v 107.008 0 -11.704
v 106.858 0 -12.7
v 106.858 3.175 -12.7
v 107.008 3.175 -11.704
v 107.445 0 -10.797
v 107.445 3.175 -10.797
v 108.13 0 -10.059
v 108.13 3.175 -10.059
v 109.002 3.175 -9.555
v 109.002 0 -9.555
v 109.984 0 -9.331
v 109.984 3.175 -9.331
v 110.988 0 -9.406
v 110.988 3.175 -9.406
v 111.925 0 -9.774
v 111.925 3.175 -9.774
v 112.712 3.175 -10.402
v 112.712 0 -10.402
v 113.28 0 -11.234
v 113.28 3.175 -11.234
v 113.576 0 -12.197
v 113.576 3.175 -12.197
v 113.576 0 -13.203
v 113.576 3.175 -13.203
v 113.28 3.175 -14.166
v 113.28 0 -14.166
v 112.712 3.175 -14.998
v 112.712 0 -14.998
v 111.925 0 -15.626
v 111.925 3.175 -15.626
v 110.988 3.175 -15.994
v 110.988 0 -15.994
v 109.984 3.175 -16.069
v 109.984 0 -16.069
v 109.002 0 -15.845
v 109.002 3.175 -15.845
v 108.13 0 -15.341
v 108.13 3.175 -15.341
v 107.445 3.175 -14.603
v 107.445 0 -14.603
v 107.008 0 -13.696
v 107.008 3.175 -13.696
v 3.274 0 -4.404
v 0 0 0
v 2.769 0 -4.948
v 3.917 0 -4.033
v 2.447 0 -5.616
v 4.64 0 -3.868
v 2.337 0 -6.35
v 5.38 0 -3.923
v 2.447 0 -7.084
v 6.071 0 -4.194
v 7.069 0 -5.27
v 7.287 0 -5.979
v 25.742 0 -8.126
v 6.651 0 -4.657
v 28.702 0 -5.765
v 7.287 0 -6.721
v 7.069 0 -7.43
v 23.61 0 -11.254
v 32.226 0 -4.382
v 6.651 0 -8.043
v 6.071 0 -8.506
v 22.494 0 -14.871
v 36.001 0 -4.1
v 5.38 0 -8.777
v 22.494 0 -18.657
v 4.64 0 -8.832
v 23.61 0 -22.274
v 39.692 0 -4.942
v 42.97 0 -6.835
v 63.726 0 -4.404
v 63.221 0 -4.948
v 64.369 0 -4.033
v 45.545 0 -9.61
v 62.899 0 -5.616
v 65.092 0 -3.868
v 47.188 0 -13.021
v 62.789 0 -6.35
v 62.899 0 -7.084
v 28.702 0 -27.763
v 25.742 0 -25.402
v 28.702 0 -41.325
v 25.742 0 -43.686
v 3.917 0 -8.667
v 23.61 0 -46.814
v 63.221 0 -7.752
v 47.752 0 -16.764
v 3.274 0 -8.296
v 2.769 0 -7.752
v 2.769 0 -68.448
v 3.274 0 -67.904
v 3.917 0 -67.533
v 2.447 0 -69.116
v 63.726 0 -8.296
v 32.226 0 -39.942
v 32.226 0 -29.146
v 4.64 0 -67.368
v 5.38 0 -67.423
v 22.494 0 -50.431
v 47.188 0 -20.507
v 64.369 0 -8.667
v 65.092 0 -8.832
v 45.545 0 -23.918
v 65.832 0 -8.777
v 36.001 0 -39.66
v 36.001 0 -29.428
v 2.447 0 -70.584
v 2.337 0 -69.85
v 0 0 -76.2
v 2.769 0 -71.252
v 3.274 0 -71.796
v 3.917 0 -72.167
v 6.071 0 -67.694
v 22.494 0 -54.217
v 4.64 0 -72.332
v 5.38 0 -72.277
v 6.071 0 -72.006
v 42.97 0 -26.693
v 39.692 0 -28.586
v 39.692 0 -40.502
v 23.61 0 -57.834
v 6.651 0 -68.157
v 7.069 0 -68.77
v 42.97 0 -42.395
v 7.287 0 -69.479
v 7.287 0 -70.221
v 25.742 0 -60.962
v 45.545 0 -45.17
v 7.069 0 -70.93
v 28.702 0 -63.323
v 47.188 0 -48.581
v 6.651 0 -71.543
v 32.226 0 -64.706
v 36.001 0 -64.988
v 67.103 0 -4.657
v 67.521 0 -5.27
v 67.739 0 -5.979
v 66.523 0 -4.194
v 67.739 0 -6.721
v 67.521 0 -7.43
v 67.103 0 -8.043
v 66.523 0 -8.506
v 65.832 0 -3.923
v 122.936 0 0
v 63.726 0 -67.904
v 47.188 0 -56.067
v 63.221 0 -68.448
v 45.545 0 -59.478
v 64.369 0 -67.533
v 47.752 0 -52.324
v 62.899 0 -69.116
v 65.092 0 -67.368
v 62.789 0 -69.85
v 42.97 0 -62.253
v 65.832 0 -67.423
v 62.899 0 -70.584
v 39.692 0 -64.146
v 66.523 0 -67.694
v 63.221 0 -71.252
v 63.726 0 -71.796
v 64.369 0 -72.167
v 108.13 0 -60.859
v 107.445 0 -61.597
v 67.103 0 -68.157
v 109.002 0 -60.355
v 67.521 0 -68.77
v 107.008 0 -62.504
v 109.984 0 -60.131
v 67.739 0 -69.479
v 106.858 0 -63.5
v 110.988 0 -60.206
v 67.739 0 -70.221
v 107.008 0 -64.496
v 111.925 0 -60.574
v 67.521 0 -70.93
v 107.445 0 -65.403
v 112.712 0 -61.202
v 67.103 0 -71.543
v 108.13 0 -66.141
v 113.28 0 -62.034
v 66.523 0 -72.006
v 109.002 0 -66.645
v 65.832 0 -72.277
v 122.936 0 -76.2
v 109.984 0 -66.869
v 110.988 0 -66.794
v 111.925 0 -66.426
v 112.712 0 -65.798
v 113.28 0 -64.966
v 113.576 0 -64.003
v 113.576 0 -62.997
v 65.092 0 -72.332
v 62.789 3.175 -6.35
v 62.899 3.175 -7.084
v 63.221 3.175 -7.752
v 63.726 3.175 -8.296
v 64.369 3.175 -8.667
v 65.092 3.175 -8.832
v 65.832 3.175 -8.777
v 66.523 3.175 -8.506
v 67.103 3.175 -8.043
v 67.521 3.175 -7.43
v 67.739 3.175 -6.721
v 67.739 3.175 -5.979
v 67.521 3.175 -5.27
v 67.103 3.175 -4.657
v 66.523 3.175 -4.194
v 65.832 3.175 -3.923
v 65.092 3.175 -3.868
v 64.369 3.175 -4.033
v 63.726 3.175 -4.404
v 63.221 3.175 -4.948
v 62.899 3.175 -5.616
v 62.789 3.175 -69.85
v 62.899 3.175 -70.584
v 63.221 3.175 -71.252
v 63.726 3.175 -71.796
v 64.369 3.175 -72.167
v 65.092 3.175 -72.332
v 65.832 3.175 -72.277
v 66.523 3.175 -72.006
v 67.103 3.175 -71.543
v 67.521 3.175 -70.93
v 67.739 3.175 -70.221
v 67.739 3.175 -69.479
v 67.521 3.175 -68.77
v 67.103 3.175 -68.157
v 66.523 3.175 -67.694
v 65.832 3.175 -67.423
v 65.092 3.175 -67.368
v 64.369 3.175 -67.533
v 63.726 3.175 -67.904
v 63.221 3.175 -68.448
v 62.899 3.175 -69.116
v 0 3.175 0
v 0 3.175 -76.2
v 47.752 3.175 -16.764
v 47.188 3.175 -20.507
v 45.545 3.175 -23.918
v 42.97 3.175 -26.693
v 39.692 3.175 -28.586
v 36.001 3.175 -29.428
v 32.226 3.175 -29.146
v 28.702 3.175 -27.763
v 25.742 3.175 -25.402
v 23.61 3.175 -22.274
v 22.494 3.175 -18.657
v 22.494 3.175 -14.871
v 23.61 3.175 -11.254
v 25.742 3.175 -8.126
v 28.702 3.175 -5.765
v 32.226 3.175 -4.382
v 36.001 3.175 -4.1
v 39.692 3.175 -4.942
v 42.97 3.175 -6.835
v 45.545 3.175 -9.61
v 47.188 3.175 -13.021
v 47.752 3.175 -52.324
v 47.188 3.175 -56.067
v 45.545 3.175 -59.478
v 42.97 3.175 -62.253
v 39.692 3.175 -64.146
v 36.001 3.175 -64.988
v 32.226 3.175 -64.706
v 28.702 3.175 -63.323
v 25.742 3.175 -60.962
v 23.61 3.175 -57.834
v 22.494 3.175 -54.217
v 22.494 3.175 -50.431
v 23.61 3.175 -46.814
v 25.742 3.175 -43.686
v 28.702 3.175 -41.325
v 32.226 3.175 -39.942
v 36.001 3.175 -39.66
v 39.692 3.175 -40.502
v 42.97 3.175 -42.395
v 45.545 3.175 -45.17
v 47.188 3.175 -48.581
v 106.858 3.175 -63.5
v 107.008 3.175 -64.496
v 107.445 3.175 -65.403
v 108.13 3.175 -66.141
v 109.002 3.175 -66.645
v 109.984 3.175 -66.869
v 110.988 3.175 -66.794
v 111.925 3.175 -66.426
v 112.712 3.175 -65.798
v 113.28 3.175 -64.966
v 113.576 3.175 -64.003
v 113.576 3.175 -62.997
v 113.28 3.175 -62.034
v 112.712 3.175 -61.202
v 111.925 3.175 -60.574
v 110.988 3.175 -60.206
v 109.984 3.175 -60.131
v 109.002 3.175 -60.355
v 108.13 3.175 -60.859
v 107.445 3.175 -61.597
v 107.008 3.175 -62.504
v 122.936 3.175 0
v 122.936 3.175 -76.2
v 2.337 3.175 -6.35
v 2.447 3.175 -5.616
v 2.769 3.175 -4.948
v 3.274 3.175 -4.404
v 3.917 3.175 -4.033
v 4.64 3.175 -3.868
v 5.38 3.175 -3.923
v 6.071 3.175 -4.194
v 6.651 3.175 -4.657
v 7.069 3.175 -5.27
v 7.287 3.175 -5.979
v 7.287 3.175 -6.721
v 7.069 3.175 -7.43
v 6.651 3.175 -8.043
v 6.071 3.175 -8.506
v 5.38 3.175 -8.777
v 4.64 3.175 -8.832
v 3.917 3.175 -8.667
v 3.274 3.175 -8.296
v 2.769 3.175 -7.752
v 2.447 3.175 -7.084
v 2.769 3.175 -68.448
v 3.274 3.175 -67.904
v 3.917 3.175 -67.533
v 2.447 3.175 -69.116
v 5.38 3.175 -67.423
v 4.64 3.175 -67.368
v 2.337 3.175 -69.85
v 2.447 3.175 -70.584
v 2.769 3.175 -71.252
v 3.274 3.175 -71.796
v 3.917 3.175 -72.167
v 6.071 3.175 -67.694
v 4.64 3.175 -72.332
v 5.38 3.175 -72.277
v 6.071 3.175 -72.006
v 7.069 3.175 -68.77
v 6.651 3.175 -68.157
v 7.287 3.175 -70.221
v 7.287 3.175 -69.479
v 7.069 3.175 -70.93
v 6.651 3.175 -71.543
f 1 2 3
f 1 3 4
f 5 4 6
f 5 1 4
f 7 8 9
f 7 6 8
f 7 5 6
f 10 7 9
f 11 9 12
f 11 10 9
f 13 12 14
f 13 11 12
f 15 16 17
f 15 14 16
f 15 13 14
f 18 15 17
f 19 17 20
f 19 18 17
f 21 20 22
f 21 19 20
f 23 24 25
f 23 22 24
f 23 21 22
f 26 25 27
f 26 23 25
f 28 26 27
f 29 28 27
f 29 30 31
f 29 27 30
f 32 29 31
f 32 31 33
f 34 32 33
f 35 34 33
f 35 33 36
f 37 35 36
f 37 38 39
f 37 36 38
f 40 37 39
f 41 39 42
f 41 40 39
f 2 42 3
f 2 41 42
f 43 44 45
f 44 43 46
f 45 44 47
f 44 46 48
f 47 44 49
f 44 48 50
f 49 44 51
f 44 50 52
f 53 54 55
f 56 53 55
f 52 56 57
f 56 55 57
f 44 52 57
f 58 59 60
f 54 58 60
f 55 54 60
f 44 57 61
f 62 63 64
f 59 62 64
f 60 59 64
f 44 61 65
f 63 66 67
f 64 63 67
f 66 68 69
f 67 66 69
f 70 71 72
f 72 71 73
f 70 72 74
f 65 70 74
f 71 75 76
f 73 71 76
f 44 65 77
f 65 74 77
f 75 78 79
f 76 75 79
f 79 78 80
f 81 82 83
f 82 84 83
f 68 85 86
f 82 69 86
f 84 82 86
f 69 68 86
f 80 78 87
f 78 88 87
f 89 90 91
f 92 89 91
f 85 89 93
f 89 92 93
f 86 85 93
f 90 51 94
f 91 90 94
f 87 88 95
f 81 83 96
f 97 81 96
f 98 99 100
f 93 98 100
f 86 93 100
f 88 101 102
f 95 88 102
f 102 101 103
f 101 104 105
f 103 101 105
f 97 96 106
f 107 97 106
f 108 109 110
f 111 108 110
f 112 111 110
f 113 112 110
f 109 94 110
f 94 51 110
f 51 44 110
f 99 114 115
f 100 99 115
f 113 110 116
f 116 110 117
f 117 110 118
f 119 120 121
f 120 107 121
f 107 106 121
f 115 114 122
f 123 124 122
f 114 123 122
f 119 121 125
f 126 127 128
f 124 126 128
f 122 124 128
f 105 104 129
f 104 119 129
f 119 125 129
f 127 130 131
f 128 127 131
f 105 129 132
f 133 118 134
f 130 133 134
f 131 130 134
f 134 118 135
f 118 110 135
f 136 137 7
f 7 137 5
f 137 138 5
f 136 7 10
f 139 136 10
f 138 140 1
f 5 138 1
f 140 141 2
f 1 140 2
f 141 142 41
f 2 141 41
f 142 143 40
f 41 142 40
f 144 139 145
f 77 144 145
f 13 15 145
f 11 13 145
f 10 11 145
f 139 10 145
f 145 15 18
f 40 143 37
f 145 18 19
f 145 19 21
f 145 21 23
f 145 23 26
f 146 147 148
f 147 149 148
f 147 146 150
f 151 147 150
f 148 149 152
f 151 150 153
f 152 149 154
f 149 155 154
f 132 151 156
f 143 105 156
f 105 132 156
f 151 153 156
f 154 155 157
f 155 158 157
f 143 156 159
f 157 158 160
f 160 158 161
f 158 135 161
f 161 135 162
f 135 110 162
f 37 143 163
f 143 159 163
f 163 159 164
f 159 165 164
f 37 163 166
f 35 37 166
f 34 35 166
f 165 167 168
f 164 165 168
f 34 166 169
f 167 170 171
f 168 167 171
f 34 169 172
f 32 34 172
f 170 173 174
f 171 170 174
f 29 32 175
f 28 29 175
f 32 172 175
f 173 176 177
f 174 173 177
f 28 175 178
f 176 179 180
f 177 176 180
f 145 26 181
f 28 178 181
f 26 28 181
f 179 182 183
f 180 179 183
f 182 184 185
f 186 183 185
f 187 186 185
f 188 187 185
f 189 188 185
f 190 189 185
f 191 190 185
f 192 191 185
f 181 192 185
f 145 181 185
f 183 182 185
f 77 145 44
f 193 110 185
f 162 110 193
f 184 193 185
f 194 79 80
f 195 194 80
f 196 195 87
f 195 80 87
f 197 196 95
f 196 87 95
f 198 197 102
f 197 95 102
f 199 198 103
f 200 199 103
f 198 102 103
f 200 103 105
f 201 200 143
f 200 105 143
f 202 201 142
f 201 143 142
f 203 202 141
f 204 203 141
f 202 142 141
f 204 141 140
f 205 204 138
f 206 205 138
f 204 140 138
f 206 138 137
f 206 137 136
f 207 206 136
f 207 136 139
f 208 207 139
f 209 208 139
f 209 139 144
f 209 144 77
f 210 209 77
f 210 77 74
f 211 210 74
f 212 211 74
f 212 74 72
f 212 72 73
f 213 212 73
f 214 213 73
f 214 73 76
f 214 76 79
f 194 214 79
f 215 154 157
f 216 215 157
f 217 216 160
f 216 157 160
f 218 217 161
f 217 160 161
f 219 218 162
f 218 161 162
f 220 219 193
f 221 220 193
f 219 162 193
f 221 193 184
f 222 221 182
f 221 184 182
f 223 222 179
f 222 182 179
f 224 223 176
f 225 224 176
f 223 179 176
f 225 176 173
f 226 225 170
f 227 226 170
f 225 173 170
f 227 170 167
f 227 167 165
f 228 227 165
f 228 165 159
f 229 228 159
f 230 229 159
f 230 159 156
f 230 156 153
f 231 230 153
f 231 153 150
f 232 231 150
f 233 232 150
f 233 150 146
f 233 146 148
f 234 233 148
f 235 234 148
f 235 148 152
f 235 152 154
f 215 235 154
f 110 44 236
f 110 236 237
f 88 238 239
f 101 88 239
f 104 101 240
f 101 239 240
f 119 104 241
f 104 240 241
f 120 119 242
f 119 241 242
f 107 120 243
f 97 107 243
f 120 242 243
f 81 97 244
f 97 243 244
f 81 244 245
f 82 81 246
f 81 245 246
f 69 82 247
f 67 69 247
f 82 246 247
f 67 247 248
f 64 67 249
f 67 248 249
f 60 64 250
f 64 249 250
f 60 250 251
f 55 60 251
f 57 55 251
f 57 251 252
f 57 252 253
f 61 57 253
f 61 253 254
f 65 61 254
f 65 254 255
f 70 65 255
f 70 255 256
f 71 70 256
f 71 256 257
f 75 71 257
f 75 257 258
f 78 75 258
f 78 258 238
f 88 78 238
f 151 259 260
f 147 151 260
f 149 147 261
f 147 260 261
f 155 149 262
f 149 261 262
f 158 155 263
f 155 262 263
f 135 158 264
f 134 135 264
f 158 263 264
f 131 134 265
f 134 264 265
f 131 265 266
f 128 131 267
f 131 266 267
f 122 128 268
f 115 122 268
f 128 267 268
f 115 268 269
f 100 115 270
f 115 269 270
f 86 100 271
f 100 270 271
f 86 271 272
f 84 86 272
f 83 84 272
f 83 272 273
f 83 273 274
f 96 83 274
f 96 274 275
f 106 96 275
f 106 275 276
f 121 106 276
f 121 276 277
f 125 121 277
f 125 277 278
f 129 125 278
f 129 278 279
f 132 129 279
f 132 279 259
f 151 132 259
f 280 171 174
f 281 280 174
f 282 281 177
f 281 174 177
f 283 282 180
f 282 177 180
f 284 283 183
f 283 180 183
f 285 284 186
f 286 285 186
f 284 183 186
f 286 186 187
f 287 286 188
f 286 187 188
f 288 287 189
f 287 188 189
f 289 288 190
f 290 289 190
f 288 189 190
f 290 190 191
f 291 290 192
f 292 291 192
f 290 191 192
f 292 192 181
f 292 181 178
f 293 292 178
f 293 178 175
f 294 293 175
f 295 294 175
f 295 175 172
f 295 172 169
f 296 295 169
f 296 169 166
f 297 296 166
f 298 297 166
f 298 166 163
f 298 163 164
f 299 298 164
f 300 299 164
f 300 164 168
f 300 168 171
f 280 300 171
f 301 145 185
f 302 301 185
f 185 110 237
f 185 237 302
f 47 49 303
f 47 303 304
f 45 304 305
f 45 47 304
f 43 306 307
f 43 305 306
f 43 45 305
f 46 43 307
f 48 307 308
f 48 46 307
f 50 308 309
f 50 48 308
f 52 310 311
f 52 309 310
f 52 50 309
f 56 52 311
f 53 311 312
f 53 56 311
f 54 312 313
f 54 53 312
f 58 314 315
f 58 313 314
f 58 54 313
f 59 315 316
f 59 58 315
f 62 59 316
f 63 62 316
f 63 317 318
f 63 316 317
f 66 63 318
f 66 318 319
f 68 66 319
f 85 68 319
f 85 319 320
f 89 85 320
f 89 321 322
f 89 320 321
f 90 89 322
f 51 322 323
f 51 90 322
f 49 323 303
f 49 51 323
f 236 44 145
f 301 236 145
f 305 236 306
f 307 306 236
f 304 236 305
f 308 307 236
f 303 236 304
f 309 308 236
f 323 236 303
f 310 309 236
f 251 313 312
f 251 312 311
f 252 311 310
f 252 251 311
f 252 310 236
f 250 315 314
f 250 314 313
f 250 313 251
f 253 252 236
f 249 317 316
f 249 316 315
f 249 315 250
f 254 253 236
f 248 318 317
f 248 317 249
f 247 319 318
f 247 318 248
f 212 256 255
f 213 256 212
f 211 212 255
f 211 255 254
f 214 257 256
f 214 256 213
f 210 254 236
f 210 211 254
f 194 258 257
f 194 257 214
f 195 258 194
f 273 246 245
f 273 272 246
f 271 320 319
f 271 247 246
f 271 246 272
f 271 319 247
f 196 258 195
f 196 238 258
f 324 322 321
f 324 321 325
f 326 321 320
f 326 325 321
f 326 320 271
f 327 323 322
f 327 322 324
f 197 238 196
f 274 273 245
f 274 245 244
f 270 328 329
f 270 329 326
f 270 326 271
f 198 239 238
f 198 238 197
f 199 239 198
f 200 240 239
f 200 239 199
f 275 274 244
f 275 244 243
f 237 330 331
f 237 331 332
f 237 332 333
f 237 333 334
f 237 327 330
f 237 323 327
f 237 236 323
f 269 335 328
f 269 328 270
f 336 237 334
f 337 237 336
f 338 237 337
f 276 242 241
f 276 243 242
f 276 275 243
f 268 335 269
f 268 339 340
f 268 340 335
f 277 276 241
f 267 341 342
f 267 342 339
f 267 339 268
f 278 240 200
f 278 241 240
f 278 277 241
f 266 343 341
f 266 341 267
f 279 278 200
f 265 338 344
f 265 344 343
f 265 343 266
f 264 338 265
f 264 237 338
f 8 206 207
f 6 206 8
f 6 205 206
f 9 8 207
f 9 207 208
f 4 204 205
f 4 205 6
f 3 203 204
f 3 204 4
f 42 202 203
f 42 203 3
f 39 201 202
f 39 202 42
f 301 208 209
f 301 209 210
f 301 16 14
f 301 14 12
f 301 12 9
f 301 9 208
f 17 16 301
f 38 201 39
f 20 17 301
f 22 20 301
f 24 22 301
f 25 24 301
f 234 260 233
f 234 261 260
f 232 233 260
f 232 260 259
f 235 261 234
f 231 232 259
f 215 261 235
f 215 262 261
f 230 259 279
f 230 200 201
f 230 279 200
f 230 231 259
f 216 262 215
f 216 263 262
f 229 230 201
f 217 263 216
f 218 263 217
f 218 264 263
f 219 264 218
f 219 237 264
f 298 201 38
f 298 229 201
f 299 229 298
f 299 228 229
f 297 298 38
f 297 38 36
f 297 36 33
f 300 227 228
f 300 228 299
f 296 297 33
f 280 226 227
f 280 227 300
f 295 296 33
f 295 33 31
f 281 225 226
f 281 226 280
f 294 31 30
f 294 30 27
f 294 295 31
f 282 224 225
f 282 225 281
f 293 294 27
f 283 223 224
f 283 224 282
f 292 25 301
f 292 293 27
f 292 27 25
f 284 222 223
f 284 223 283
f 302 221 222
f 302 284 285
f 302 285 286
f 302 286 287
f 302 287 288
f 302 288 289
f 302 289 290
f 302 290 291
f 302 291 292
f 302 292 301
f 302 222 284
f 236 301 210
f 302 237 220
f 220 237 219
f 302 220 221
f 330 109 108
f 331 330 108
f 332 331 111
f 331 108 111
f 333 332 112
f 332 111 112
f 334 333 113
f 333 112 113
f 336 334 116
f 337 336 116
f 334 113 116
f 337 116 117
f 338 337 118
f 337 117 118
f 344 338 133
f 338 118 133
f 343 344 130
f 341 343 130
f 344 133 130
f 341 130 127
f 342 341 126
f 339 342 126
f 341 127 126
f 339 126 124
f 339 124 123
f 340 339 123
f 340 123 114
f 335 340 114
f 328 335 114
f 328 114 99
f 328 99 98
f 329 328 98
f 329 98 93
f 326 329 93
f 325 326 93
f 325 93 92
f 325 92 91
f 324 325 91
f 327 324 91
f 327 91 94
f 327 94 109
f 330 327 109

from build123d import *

# Parameters (mm, degrees)
SKETCH2_W                    = 122.936
SKETCH2_H                    = 76.2
BOSS_EXTRUDE1_DEPTH          = 3.175
F_10_0_1935_DIAMETER_HOLE1_D = 4.9784
LPATTERN1_COUNT              = 2
LPATTERN1_PITCH              = 60.452
F_1_4_0_25_DIAMETER_HOLE1_D  = 6.7564
MIRROR1_COPY_1_D             = 4.9784
SKETCH7_R                    = 12.7
CUT_EXTRUDE1_DEPTH           = 4.175


with BuildPart() as part:
    # Sketch2 → Boss-Extrude1 (new body)
    with BuildSketch(Plane(origin=(0, 0, 0), x_dir=(1, 0, 0), z_dir=(0, 1, 0))):
        with Locations((61.468, 38.1)):
            Rectangle(SKETCH2_W, SKETCH2_H)
    extrude(amount=BOSS_EXTRUDE1_DEPTH)

    # #10 (0.1935) Diameter Hole1 (through all)
    with Locations(Plane(origin=(0, 3.175, 0), x_dir=(1, 0, 0), z_dir=(0, 1, 0))):
        with Locations((4.826, 69.85)):
            f_10_0_1935_diameter_hole1 = Hole(F_10_0_1935_DIAMETER_HOLE1_D / 2)

    # LPattern1: #10 (0.1935) Diameter Hole1 ×2
    with Locations(*[(i * LPATTERN1_PITCH, 0, 0) for i in range(1, LPATTERN1_COUNT)]):
        add(f_10_0_1935_diameter_hole1, mode=Mode.SUBTRACT)

    # 1/4 (0.25) Diameter Hole1 (through all)
    with Locations(Plane(origin=(0, 3.175, 0), x_dir=(1, 0, 0), z_dir=(0, 1, 0))):
        with Locations((110.236, 63.5)):
            f_1_4_0_25_diameter_hole1 = Hole(F_1_4_0_25_DIAMETER_HOLE1_D / 2)

    # Mirror1: 1/4 (0.25) Diameter Hole1, #10 (0.1935) Diameter Hole1 across plane
    add(f_1_4_0_25_diameter_hole1.mirror(Plane(origin=(0, 0, -38.1), x_dir=(1, 0, 0), z_dir=(0, 0, -1))), mode=Mode.SUBTRACT)
    add(f_10_0_1935_diameter_hole1.mirror(Plane(origin=(0, 0, -38.1), x_dir=(1, 0, 0), z_dir=(0, 0, -1))), mode=Mode.SUBTRACT)

    # Mirror1 copy 1 (through all)
    with Locations(Plane(origin=(60.452, 3.175, -76.2), x_dir=(1, 0, 0), z_dir=(0, 1, 0))):
        with Locations((4.826, -69.85)):
            Hole(MIRROR1_COPY_1_D / 2)

    # Sketch7 → Cut-Extrude1 (cut, through all)
    with BuildSketch(Plane(origin=(0, 3.175, 0), x_dir=(1, 0, 0), z_dir=(0, 1, 0))):
        with Locations((35.052, 16.764)):
            Circle(SKETCH7_R)
        with Locations((35.052, 52.324)):
            Circle(SKETCH7_R)
    extrude(amount=-CUT_EXTRUDE1_DEPTH, mode=Mode.SUBTRACT)


solid = part.part
